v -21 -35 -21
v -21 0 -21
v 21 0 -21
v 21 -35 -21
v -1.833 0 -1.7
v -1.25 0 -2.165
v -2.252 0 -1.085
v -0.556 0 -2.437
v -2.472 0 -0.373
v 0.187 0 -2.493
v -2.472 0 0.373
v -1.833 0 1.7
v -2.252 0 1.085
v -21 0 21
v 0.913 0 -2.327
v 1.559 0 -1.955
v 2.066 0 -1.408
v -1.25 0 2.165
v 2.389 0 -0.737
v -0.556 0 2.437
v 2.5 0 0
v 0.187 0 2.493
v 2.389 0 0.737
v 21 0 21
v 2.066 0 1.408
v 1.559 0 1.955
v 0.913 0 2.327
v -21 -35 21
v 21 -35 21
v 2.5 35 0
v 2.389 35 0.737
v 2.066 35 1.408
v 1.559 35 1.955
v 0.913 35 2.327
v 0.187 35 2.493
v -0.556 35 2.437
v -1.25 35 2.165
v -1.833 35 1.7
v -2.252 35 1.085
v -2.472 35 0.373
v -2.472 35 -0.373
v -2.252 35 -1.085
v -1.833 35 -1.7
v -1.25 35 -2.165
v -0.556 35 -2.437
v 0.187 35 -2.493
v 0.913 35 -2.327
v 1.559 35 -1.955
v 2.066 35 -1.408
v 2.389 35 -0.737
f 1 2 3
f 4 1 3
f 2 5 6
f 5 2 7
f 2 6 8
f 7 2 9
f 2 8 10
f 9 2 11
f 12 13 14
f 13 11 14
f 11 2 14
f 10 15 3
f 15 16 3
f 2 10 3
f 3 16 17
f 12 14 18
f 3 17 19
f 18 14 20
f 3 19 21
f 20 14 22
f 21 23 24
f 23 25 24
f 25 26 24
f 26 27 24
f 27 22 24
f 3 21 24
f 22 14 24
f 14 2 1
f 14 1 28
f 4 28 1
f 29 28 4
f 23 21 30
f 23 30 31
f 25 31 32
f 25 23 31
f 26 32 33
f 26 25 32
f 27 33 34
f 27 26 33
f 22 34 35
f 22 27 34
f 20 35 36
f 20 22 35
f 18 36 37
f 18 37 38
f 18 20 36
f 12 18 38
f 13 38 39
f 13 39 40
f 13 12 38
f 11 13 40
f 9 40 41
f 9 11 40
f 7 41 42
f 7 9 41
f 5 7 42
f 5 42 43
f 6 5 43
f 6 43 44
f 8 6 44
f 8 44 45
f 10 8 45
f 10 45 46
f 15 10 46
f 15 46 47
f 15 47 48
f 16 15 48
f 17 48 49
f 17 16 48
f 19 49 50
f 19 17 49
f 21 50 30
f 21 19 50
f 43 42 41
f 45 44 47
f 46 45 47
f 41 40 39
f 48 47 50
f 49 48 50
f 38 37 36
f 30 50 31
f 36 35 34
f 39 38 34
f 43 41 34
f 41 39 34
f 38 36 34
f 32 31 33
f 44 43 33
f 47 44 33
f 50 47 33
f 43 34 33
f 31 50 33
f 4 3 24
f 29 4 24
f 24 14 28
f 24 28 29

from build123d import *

# Parameters (mm, degrees)
F0_W     = 42
F0_H     = 42
F0_R     = 2.5
F1_DEPTH = 35
F2_DEPTH = 35


with BuildPart() as f1:
    # F0 (on Front) → F1 (new body)
    with BuildSketch(Plane.XZ):
        Rectangle(F0_W, F0_H)
        Circle(F0_R, mode=Mode.SUBTRACT)
        Circle(F0_R)
    extrude(amount=F1_DEPTH)

    # F0 (on Front) → F2 (join)
    with BuildSketch(Plane.XZ):
        Circle(F0_R)
    extrude(amount=-F2_DEPTH)


solid = f1.part
